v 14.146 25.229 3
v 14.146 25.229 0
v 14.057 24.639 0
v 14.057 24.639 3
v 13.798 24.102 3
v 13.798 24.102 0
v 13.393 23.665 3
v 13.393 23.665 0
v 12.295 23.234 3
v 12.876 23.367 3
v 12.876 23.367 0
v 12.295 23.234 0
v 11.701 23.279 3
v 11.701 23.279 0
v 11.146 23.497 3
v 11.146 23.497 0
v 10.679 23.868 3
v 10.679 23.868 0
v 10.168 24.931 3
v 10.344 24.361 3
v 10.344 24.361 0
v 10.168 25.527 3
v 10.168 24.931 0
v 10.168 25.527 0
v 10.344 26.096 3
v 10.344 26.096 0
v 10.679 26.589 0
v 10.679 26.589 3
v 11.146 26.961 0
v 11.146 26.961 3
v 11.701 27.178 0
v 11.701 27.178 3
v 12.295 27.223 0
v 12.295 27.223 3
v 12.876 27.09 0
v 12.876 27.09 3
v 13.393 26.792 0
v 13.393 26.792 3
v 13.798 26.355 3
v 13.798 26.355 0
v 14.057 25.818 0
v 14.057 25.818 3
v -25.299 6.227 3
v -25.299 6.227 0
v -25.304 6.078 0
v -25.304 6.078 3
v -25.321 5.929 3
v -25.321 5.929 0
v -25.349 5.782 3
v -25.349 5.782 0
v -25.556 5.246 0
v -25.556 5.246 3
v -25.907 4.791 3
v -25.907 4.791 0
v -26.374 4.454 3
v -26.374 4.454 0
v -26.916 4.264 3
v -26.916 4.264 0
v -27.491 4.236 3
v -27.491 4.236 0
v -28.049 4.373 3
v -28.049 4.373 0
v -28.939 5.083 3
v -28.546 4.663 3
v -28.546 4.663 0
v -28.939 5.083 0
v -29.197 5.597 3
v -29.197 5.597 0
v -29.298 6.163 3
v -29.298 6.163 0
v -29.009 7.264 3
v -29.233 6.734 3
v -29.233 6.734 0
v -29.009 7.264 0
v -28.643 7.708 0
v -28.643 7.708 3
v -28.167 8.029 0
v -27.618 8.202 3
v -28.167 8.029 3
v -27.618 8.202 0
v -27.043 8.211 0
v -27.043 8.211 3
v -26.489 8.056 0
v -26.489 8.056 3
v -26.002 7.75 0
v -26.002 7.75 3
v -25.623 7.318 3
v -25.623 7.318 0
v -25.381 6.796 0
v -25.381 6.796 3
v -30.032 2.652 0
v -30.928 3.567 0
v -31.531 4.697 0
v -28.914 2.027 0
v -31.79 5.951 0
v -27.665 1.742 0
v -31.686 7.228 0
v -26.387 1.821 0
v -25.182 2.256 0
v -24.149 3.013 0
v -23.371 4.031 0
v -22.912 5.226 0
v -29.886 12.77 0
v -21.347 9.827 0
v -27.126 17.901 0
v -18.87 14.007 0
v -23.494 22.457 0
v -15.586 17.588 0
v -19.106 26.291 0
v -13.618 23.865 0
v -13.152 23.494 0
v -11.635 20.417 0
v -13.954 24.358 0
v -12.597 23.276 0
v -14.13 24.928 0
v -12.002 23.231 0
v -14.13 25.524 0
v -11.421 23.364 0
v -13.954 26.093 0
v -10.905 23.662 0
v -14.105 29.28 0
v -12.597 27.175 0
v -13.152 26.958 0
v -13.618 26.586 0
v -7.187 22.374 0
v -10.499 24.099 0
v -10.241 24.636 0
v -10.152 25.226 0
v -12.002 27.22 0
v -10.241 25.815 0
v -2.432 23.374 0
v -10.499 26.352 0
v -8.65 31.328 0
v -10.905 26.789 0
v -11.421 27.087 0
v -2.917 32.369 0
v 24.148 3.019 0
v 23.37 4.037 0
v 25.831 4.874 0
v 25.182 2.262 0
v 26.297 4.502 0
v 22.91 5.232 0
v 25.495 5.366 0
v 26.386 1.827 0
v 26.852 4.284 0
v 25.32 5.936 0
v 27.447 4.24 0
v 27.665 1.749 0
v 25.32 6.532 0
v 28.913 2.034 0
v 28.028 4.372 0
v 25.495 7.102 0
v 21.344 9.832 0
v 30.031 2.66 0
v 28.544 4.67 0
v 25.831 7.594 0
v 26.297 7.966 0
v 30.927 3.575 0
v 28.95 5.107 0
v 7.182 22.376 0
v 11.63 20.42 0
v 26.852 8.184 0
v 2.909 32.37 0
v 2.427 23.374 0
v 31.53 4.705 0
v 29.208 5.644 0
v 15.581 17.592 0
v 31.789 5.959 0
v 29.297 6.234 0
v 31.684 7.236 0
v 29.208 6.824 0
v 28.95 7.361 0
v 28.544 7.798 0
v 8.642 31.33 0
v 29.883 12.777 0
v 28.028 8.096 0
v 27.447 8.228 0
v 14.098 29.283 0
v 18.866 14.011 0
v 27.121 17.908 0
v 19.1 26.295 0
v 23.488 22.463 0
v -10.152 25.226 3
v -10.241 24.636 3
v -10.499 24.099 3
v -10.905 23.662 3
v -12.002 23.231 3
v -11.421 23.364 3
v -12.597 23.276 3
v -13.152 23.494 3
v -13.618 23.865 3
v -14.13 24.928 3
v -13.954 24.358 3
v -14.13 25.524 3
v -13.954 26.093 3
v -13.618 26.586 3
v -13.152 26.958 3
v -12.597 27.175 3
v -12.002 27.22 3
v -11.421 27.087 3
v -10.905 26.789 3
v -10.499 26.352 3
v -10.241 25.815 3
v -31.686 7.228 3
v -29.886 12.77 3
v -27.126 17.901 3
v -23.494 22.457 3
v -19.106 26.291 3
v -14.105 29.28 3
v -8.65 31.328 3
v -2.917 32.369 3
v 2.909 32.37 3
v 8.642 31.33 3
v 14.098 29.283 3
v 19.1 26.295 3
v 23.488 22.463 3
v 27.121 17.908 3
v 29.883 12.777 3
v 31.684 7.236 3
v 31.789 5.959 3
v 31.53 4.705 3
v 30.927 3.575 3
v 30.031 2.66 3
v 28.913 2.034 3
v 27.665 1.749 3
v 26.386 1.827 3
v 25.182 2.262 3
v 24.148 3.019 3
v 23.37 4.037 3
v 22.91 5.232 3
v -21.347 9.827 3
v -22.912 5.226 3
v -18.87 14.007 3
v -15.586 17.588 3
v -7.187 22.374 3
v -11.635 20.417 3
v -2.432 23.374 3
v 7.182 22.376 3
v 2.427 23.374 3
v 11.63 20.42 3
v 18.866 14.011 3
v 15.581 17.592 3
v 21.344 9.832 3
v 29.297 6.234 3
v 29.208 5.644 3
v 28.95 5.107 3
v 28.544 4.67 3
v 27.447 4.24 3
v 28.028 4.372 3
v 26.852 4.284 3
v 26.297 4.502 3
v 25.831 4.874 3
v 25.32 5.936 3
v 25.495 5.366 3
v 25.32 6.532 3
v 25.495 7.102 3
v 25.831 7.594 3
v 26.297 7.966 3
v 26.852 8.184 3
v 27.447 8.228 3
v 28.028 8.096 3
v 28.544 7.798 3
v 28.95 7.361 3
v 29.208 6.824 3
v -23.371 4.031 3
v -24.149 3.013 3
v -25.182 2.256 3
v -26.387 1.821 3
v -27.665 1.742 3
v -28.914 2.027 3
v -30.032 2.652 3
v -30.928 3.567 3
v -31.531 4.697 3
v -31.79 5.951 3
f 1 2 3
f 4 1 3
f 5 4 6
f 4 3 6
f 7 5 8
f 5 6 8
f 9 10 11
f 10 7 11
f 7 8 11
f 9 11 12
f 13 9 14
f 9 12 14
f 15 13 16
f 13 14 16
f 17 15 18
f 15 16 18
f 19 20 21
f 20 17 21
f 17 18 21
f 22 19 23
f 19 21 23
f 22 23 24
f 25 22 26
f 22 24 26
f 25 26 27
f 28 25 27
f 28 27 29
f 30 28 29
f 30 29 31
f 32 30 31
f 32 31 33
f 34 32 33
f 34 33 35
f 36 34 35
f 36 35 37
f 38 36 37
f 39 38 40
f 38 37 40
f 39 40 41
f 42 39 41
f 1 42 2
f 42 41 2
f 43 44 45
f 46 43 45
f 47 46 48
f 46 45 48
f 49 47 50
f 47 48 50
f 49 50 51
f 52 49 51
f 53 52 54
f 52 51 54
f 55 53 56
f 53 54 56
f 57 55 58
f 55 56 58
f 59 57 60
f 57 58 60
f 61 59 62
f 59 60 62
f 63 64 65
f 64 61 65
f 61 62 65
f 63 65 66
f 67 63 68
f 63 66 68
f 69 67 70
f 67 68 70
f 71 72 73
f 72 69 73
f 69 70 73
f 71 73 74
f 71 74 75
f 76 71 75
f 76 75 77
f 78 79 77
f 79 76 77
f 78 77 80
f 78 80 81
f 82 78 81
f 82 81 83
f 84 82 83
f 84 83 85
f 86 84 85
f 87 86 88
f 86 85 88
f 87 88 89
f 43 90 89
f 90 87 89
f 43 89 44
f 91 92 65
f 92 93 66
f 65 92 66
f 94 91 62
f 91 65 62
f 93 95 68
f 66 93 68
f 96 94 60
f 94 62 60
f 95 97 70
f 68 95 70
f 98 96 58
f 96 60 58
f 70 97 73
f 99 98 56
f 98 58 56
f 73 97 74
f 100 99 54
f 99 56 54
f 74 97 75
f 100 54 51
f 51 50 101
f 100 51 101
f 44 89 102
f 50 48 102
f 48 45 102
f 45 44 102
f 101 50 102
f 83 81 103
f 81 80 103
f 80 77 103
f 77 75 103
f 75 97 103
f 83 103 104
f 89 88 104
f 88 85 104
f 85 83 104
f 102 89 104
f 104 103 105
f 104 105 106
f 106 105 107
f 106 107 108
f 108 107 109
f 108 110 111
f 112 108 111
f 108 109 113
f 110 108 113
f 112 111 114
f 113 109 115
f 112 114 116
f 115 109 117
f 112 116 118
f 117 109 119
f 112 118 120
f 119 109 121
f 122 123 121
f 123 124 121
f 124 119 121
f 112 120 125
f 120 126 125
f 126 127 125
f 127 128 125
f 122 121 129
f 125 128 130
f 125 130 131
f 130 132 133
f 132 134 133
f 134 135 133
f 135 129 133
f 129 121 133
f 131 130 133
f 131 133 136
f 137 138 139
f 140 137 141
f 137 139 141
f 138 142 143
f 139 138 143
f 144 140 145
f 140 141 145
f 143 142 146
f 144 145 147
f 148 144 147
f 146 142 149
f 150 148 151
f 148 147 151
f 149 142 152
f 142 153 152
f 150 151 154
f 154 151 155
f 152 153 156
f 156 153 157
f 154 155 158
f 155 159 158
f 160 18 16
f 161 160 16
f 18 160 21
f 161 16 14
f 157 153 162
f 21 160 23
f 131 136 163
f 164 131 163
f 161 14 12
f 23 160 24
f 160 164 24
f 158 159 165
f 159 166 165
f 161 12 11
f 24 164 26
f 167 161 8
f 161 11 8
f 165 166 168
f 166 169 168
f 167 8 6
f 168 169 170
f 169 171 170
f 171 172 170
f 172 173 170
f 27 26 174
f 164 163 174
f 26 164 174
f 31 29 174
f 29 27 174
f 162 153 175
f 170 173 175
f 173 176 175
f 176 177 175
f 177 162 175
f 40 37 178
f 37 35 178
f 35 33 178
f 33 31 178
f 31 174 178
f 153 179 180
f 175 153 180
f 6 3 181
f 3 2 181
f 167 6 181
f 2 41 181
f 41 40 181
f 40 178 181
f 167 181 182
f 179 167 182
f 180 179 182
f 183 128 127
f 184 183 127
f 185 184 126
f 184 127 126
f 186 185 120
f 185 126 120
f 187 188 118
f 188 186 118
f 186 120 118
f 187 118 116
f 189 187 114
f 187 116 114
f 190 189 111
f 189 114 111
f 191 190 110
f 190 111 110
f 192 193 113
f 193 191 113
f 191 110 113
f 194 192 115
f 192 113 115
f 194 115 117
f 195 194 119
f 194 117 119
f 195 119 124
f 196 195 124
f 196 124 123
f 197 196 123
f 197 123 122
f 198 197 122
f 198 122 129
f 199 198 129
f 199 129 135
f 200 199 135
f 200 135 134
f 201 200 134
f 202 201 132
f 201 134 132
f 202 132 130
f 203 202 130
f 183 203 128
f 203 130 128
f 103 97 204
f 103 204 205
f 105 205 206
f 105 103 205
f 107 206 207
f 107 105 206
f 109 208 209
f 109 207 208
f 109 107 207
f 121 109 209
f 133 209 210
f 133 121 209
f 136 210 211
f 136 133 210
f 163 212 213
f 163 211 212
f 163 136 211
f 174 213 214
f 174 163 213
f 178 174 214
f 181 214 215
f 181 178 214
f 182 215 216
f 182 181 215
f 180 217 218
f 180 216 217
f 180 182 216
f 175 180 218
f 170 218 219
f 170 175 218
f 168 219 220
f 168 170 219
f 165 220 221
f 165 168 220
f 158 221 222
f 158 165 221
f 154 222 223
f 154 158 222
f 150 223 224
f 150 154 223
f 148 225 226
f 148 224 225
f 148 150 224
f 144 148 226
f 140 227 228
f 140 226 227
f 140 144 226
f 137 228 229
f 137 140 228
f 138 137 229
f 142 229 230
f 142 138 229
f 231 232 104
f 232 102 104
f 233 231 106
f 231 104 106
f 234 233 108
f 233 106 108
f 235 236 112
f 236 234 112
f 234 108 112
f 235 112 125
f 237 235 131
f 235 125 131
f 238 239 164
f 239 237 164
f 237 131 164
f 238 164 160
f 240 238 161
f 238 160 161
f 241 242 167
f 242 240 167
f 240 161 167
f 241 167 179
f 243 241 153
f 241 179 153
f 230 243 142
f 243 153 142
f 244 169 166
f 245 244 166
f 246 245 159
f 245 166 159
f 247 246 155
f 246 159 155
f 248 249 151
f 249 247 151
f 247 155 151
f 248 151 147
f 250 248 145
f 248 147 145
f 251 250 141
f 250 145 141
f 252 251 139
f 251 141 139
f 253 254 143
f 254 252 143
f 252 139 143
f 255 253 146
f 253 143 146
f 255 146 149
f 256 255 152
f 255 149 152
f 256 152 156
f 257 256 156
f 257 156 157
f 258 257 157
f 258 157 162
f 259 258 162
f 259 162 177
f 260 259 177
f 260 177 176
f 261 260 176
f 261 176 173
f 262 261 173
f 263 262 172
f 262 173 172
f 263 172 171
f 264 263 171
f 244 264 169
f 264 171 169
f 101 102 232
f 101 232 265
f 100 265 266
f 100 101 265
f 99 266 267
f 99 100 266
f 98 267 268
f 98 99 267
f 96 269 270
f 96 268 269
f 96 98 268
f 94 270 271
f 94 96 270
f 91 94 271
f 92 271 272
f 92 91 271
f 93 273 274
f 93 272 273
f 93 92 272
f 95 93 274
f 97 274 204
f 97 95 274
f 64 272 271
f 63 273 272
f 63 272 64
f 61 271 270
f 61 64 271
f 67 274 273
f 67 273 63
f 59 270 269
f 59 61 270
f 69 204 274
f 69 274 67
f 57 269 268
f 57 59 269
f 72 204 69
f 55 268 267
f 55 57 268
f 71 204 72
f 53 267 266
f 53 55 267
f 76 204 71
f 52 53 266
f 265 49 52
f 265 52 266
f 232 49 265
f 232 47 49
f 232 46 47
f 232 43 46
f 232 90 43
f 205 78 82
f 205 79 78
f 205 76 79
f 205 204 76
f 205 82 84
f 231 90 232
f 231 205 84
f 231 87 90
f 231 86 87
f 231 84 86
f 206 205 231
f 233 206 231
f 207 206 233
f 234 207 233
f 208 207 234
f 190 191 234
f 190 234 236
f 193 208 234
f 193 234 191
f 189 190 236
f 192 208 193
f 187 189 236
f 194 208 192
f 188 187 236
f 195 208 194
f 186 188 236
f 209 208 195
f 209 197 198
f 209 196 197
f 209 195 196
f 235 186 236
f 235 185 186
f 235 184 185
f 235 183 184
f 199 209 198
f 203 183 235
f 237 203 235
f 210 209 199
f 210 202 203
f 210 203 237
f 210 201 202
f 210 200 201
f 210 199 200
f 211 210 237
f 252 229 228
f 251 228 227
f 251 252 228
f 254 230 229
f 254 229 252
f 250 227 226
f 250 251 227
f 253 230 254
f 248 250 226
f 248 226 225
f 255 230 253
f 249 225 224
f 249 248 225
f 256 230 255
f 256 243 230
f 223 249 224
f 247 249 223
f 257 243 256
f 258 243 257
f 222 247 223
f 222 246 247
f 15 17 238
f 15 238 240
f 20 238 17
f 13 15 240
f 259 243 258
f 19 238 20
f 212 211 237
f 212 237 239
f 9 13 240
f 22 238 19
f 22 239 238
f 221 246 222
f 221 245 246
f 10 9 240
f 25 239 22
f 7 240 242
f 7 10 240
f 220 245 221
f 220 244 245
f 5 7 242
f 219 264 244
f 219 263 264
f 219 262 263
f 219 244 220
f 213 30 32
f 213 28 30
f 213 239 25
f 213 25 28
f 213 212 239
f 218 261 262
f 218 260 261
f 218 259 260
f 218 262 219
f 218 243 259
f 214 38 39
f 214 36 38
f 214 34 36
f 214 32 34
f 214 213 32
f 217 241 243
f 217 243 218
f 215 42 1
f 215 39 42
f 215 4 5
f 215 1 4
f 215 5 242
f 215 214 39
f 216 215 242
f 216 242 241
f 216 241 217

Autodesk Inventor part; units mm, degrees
ref_plane "YZ Plane" through (0, 0, 0) normal (1, 0, 0) x (0, 1, 0)
ref_plane "XZ Plane" through (0, 0, 0) normal (0, 1, 0) x (-1, 0, 0)
ref_plane "XY Plane" through (0, 0, 0) normal (0, 0, 1) x (1, 0, 0)
sketch "Sketch1" plane through (0, 0, 0) normal (0, 0, 1) x (1, 0, 0)
  circle A0 centre (27.2972, 6.234) radius 2
  circle A1 centre (12.1456, 25.2286) radius 2
  circle A2 centre (-12.1519, 25.2256) radius 2
  circle A3 centre (-27.2988, 6.2272) radius 2
  circle A4 centre (-21.8891, -17.4604) radius 2
  circle A5 centre (0.0035, -28) radius 2
  circle A6 centre (21.8935, -17.455) radius 2
  arc A7 (-18.3712, -14.6543) -> (-25.407, -20.2666) centre (-21.8891, -17.4604) ccw
  arc A8 (-31.6861, 7.228) -> (-22.9115, 5.2264) centre (-27.2988, 6.2272) ccw
  line L0 (0, 0) -> (-27.2988, 6.2272)
  line L1 (0, 0) -> (-28.0096, 0)
  arc A9 (22.9102, 5.2321) -> (31.6843, 7.2359) centre (27.2972, 6.234) ccw
  arc A10 (25.412, -20.2603) -> (18.3749, -14.6497) centre (21.8935, -17.455) ccw
  arc A11 (18.3162, -14.7229) -> (18.3749, -14.6497) centre (0, 0) ccw
  arc A12 (22.9102, 5.2321) -> (-22.9115, 5.2264) centre (0, 0) ccw
  arc A13 (25.3999, -20.2755) -> (25.412, -20.2603) centre (0, 0) ccw
  arc A14 (31.6843, 7.2359) -> (-31.6861, 7.228) centre (0, 0) ccw
  arc A15 (31.3012, -23.1554) -> (15.9051, -8.2279) centre (21.8935, -17.455) ccw
  line L2 (21.8935, -17.455) -> (20.255, -16.308)
  line L3 (18.0457, -14.7615) -> (15.8179, -13.202)
  line L4 (21.8935, -17.455) -> (23.0905, -19.0572)
  line L5 (25.3705, -22.1091) -> (26.3321, -23.3962)
  arc A16 (25.3999, -20.2755) -> (25.3705, -22.1091) centre (26.5722, -21.2113) ccw
  arc A17 (26.3321, -23.3962) -> (31.3012, -23.1554) centre (28.7355, -21.6007) ccw
  arc A18 (15.9051, -8.2279) -> (15.8179, -13.202) centre (17.5383, -10.7444) ccw
  arc A19 (18.0457, -14.7615) -> (18.3162, -14.7229) centre (18.1604, -14.5976) ccw
  point P0 (28.477, -26.2673)
  point P1 (12.8819, -11.1468)
  point P2 (18.1984, -14.8684)
  point P3 (24.6644, -21.164)
  dimension "d2" = 4
  dimension "d5" = 360
  dimension "d7" = 9
  dimension "d8" = 9
  dimension "d11" = 12.85
  dimension "d12" = 54.596
  dimension "d13" = 9
  dimension "d14" = 22
  dimension "d15" = 1.5
  dimension "d16" = 3
  dimension "d17" = 0.2
extrude "Extrusion1" add sketch "Sketch1" along normal blind 3 contours A14 A9 A12 A8
properties part number "fin entraineur mod"
